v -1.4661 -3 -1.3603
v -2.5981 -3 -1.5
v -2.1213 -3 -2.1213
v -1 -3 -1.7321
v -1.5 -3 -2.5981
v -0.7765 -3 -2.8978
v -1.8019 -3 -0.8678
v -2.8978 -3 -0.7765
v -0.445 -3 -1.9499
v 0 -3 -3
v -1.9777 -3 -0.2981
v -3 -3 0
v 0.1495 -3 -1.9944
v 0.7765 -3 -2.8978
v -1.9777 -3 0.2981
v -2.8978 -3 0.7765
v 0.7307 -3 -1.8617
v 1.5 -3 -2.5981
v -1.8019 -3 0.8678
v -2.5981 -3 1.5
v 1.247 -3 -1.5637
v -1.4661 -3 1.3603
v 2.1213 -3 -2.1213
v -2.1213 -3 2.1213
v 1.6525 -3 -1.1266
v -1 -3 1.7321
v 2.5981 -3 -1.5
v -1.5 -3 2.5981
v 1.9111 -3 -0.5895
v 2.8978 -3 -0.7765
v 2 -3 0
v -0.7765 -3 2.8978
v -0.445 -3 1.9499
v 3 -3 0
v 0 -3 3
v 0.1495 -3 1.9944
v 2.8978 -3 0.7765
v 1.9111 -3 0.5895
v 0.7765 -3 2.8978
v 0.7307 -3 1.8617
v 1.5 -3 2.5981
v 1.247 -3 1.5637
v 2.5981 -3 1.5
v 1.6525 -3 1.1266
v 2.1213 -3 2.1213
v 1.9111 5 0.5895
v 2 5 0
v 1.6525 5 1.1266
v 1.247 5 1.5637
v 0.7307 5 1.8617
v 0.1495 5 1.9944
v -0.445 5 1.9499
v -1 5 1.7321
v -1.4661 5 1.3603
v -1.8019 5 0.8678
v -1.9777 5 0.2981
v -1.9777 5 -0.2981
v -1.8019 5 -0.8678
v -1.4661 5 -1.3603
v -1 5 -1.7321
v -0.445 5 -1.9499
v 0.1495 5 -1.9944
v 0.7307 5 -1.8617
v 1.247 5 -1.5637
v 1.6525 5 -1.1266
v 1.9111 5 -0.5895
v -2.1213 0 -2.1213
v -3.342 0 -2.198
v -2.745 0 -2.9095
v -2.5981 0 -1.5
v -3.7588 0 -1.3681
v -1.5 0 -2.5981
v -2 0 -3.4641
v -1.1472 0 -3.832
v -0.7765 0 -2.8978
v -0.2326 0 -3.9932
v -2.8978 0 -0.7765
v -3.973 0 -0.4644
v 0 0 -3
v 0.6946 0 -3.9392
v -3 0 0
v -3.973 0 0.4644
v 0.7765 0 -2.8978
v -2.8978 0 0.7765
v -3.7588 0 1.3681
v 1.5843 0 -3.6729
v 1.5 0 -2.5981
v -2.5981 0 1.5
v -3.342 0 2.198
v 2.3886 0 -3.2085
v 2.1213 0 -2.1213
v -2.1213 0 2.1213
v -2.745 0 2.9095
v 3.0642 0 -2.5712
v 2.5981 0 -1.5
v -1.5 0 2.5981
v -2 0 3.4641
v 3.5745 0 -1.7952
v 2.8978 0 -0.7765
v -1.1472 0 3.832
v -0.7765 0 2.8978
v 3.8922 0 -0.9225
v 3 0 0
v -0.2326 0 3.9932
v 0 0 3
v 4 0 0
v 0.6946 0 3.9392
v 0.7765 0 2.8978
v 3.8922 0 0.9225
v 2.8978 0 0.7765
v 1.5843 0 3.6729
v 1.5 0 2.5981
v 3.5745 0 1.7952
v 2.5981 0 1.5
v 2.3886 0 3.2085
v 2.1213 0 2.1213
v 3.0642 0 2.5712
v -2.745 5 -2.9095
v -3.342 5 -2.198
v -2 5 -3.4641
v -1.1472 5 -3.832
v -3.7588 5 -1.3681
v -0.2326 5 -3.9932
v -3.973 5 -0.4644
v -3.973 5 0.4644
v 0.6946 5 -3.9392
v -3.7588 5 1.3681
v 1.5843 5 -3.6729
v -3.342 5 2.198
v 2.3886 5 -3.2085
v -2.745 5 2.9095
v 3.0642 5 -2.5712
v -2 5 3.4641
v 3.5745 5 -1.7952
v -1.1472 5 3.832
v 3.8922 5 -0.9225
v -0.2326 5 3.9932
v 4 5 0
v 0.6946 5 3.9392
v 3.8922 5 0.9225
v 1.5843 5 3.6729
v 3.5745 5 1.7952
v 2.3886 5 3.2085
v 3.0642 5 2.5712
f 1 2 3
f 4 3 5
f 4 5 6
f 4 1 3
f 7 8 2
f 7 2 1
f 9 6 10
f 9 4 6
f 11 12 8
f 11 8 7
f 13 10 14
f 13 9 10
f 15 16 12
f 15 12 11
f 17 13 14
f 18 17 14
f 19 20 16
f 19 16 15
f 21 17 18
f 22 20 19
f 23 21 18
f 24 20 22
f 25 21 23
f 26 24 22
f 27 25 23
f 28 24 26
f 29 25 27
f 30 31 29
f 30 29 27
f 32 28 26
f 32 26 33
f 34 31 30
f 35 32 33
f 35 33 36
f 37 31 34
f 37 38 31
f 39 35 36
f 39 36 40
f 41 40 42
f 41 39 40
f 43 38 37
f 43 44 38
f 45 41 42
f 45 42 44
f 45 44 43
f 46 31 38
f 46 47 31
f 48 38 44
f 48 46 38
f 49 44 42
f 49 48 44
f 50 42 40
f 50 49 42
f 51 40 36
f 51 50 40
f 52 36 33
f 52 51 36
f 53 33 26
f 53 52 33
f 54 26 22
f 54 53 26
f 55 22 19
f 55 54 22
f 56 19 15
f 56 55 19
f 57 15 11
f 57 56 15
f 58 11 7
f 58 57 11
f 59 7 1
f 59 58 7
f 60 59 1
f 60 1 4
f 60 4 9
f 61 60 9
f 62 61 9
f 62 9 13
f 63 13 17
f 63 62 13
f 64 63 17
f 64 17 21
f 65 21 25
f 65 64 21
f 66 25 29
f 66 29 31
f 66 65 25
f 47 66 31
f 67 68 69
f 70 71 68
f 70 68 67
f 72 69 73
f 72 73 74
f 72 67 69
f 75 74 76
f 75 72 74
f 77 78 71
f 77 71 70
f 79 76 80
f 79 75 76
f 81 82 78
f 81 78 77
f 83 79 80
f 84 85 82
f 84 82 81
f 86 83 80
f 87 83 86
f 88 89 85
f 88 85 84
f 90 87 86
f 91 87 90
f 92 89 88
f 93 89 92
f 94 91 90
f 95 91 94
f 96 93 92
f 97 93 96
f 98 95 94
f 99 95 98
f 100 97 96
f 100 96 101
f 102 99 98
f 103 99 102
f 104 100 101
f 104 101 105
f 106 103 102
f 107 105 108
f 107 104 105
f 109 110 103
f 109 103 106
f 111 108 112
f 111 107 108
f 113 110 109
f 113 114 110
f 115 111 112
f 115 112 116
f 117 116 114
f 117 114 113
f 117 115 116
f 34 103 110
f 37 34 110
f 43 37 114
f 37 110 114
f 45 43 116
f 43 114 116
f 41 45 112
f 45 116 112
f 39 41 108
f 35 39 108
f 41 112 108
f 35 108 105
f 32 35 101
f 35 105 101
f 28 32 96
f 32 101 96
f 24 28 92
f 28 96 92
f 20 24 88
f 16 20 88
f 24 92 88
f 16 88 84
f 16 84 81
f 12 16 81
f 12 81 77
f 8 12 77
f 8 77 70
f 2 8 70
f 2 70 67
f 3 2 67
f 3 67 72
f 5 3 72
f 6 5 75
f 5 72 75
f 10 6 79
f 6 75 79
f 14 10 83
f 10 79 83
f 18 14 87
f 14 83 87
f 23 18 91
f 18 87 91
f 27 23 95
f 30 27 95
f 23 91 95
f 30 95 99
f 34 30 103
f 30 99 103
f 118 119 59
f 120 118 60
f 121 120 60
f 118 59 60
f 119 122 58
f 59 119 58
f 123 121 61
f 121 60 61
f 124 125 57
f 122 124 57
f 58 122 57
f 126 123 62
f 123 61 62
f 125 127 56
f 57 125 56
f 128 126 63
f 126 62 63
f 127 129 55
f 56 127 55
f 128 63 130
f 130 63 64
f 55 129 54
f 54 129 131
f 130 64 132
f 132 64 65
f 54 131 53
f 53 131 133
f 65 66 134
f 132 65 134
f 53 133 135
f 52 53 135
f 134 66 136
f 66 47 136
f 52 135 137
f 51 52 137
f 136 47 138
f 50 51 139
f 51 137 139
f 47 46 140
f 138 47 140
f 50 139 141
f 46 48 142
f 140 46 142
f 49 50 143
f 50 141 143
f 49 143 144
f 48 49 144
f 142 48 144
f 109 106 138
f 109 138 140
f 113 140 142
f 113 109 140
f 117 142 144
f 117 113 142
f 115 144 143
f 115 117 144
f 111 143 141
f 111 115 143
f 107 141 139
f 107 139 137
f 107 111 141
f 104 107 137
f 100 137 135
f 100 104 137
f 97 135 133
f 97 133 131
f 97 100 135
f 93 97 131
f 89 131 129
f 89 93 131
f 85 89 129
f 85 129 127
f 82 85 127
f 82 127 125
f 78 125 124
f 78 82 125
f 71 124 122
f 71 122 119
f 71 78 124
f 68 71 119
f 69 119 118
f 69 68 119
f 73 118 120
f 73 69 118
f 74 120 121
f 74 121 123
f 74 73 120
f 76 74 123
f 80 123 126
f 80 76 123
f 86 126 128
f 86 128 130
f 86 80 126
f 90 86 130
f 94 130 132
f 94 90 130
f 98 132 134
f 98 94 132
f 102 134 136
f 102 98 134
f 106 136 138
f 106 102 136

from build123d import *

# Parameters (mm, degrees)
F0_R     = 3
F0_R_2   = 2
F1_DEPTH = 5
F0_R_3   = 4
F2_DEPTH = 5
F3_DEPTH = 3


with BuildPart() as f1:
    # F0 (on Front) → F1 (new body)
    with BuildSketch(Plane.XZ):
        Circle(F0_R)
        Circle(F0_R_2, mode=Mode.SUBTRACT)
    extrude(amount=-F1_DEPTH)

    # F0 (on Front) → F2 (join)
    with BuildSketch(Plane.XZ):
        Circle(F0_R_3)
        Circle(F0_R, mode=Mode.SUBTRACT)
    extrude(amount=-F2_DEPTH)

    # F0 (on Front) → F3 (join)
    with BuildSketch(Plane.XZ):
        Circle(F0_R)
        Circle(F0_R_2, mode=Mode.SUBTRACT)
    extrude(amount=F3_DEPTH)


solid = f1.part
